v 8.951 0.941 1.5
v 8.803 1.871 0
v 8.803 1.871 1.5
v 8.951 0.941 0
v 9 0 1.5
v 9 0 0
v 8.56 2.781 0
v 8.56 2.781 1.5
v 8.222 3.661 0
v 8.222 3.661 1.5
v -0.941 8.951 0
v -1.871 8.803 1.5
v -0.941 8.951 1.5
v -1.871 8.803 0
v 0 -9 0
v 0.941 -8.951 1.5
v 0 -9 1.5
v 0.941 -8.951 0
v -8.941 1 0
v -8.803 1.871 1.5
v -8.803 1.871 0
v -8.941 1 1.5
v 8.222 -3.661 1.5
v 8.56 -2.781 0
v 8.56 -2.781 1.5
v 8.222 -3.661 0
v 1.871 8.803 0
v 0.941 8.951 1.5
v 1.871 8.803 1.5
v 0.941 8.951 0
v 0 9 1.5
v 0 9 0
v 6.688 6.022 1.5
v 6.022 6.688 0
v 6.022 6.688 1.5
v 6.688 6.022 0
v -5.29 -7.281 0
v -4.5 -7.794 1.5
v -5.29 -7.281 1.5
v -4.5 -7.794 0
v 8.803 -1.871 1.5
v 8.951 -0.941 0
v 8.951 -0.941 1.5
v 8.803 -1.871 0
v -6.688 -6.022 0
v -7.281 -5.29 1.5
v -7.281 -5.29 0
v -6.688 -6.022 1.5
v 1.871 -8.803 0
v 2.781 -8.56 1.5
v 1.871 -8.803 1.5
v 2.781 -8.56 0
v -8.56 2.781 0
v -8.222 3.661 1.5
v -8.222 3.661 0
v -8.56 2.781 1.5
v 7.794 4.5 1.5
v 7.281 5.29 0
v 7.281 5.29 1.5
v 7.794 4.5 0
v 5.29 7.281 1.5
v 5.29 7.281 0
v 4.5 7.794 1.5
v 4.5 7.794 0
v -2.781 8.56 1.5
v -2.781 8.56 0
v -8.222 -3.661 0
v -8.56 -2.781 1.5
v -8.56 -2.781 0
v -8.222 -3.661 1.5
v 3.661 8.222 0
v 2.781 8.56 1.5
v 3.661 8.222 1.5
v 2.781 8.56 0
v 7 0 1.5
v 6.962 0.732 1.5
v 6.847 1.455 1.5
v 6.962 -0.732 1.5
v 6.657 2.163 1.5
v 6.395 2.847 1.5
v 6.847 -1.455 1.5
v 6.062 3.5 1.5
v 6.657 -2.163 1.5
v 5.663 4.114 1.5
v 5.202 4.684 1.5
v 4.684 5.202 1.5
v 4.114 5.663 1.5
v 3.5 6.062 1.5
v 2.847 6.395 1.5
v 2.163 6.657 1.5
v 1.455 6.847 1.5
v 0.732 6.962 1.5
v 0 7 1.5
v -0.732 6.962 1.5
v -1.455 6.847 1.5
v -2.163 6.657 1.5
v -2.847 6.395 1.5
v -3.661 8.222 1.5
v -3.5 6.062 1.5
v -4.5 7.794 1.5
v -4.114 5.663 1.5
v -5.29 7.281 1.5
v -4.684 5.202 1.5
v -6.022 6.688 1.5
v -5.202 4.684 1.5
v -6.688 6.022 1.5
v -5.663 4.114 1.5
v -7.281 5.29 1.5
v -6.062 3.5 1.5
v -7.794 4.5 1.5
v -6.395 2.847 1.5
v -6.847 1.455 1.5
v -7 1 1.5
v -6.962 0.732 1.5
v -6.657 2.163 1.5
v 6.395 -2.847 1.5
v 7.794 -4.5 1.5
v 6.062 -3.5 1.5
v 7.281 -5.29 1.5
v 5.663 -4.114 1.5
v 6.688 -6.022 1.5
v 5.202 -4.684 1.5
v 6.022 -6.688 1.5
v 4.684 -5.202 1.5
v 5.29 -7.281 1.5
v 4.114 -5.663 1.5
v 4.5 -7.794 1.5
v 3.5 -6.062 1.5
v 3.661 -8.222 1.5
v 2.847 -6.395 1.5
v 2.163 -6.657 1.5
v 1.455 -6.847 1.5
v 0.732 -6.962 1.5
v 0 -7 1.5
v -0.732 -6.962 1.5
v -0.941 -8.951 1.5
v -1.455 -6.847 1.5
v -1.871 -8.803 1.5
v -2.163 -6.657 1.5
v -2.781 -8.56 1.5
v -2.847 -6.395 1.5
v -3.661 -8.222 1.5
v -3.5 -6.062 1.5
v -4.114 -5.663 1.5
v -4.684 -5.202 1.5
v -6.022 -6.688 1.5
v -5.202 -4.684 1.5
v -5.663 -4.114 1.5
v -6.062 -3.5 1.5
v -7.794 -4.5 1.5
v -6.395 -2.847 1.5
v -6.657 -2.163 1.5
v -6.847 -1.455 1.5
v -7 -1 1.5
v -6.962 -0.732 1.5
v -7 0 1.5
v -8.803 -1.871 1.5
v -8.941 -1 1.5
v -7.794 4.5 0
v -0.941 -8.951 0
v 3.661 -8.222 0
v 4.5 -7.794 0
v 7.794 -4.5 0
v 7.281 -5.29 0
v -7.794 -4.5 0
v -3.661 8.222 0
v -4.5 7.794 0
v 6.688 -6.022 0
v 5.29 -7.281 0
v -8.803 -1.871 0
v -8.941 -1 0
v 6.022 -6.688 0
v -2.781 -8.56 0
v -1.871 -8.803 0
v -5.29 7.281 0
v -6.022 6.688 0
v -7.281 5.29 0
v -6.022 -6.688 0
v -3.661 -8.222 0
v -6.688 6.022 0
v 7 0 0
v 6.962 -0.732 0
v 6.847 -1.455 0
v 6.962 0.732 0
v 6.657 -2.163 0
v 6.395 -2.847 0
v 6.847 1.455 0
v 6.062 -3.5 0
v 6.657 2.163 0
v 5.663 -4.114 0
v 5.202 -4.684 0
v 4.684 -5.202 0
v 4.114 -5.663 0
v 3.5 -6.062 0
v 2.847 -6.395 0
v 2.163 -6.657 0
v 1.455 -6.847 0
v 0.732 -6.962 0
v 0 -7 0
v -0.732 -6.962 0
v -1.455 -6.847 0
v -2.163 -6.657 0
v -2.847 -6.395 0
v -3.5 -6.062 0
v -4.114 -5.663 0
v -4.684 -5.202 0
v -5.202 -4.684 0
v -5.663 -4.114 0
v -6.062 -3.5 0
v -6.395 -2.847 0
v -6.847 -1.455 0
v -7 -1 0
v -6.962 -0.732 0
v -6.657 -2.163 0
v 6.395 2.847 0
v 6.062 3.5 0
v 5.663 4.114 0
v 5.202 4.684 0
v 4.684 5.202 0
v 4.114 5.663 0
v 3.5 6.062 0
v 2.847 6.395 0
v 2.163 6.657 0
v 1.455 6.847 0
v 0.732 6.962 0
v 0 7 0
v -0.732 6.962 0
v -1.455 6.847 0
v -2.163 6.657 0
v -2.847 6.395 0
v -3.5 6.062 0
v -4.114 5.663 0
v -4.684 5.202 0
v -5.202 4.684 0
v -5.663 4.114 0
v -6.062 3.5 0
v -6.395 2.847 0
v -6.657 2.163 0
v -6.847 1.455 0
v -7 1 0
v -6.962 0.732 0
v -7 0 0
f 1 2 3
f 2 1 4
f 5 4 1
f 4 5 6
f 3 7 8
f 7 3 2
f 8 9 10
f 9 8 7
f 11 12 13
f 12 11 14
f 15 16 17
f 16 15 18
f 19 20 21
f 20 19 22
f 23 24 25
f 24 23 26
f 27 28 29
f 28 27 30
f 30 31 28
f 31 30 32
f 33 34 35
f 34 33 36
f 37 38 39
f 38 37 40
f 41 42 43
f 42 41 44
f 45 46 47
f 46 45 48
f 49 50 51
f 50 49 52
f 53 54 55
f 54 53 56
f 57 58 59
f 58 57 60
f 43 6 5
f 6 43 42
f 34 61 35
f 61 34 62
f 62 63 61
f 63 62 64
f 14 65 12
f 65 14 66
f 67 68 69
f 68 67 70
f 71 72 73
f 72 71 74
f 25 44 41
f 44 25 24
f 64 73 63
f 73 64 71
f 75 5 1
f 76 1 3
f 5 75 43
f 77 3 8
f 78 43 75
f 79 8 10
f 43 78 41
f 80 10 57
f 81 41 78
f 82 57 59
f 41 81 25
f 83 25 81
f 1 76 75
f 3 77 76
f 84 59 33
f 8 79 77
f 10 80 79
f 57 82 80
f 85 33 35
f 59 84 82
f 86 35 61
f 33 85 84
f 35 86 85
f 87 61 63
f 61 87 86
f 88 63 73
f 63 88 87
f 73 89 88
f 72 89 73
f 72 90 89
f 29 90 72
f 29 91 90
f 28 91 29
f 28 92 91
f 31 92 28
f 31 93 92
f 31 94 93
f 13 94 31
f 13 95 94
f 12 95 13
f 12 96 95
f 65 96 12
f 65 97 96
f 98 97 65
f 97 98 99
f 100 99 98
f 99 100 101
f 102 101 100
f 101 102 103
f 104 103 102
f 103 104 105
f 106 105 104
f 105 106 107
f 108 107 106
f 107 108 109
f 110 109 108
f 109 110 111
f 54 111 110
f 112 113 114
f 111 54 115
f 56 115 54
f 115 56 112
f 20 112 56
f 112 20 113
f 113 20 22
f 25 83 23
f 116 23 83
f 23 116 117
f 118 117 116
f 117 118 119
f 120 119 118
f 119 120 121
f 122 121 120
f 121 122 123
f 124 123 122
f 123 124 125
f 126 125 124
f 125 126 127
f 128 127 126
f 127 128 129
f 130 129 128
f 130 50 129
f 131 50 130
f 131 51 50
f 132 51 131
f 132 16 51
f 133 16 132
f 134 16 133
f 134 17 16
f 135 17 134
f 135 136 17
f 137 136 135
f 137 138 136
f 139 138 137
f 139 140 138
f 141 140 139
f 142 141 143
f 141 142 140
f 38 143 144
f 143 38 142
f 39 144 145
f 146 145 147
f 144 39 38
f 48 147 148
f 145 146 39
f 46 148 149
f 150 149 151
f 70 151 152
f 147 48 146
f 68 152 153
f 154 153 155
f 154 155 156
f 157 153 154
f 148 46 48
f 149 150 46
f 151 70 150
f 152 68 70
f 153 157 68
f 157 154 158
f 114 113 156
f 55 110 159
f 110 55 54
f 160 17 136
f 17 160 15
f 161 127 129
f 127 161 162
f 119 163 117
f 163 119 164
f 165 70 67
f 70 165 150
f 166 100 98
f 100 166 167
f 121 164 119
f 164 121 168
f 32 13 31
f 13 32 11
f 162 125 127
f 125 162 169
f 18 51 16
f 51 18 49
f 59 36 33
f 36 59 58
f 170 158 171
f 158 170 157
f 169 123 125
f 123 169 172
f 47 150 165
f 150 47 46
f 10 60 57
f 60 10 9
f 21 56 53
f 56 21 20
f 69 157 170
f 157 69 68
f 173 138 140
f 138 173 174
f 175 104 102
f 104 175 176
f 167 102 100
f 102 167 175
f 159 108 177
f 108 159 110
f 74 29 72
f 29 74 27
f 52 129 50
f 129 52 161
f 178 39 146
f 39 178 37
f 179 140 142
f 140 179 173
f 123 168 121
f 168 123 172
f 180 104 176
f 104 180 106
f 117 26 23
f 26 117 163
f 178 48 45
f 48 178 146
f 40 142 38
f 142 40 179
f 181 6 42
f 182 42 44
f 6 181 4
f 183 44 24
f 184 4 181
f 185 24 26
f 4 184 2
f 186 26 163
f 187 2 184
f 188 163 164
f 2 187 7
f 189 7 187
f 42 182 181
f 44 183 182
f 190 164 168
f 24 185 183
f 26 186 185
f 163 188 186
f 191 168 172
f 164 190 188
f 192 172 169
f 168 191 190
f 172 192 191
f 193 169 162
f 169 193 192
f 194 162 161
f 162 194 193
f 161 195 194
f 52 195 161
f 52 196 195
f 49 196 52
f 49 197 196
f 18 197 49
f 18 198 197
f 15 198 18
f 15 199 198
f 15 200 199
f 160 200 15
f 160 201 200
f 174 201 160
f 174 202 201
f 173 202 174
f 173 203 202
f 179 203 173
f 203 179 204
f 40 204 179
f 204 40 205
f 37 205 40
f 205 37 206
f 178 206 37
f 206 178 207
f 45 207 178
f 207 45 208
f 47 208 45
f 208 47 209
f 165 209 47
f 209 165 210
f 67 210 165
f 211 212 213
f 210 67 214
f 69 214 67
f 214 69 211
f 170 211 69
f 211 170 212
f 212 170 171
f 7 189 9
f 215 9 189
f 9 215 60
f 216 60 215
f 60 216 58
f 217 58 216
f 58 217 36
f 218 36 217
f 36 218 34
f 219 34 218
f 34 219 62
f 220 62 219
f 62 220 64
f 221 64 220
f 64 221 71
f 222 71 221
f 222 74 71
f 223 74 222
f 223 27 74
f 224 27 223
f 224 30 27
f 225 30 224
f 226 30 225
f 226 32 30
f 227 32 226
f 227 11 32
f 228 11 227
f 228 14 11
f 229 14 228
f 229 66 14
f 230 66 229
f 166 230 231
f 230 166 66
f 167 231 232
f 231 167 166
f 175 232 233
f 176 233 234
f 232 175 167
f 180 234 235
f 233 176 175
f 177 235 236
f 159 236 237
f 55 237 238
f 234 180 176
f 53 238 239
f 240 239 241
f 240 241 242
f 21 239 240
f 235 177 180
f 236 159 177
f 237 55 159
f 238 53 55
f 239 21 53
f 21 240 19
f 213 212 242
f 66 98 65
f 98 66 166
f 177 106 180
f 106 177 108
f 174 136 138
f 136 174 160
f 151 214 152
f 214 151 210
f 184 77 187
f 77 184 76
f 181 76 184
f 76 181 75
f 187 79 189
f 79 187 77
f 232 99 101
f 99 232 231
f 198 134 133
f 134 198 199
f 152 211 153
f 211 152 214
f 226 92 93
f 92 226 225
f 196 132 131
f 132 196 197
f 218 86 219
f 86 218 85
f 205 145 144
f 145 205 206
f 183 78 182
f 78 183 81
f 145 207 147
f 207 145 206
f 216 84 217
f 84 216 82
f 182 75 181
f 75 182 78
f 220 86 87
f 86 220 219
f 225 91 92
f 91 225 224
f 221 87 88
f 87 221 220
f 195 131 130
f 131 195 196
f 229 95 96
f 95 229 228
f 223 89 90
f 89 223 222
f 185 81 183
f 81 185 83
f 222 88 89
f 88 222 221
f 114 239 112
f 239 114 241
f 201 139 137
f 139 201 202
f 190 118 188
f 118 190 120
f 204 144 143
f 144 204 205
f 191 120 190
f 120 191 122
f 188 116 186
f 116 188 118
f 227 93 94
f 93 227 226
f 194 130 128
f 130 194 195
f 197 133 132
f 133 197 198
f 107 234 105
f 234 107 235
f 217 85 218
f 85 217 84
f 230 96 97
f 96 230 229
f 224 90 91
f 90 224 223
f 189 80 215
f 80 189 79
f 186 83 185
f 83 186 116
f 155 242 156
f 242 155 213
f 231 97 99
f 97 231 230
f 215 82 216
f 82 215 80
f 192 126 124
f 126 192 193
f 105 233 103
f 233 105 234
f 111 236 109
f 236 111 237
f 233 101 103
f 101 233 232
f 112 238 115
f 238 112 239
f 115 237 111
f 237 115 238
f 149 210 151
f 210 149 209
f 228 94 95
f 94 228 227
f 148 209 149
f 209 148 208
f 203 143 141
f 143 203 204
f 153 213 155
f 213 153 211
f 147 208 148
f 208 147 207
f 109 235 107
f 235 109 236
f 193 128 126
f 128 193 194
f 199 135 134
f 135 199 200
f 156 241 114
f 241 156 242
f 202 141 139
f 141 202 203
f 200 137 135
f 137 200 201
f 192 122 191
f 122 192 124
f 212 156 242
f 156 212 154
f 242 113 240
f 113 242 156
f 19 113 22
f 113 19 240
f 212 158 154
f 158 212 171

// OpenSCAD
// Internal retaining ring.
$fn = 60;
eps = 0.02;
inner_d = 14;
outer_d = 18;
thickness = max(1.2, 1.5);
difference() { cylinder(d=outer_d,h=thickness); translate([0,0,-eps]) cylinder(d=inner_d,h=thickness+2*eps); translate([-outer_d/2-eps,-1,-eps]) cube([outer_d/2-inner_d/2+eps,2,thickness+2*eps]); }
